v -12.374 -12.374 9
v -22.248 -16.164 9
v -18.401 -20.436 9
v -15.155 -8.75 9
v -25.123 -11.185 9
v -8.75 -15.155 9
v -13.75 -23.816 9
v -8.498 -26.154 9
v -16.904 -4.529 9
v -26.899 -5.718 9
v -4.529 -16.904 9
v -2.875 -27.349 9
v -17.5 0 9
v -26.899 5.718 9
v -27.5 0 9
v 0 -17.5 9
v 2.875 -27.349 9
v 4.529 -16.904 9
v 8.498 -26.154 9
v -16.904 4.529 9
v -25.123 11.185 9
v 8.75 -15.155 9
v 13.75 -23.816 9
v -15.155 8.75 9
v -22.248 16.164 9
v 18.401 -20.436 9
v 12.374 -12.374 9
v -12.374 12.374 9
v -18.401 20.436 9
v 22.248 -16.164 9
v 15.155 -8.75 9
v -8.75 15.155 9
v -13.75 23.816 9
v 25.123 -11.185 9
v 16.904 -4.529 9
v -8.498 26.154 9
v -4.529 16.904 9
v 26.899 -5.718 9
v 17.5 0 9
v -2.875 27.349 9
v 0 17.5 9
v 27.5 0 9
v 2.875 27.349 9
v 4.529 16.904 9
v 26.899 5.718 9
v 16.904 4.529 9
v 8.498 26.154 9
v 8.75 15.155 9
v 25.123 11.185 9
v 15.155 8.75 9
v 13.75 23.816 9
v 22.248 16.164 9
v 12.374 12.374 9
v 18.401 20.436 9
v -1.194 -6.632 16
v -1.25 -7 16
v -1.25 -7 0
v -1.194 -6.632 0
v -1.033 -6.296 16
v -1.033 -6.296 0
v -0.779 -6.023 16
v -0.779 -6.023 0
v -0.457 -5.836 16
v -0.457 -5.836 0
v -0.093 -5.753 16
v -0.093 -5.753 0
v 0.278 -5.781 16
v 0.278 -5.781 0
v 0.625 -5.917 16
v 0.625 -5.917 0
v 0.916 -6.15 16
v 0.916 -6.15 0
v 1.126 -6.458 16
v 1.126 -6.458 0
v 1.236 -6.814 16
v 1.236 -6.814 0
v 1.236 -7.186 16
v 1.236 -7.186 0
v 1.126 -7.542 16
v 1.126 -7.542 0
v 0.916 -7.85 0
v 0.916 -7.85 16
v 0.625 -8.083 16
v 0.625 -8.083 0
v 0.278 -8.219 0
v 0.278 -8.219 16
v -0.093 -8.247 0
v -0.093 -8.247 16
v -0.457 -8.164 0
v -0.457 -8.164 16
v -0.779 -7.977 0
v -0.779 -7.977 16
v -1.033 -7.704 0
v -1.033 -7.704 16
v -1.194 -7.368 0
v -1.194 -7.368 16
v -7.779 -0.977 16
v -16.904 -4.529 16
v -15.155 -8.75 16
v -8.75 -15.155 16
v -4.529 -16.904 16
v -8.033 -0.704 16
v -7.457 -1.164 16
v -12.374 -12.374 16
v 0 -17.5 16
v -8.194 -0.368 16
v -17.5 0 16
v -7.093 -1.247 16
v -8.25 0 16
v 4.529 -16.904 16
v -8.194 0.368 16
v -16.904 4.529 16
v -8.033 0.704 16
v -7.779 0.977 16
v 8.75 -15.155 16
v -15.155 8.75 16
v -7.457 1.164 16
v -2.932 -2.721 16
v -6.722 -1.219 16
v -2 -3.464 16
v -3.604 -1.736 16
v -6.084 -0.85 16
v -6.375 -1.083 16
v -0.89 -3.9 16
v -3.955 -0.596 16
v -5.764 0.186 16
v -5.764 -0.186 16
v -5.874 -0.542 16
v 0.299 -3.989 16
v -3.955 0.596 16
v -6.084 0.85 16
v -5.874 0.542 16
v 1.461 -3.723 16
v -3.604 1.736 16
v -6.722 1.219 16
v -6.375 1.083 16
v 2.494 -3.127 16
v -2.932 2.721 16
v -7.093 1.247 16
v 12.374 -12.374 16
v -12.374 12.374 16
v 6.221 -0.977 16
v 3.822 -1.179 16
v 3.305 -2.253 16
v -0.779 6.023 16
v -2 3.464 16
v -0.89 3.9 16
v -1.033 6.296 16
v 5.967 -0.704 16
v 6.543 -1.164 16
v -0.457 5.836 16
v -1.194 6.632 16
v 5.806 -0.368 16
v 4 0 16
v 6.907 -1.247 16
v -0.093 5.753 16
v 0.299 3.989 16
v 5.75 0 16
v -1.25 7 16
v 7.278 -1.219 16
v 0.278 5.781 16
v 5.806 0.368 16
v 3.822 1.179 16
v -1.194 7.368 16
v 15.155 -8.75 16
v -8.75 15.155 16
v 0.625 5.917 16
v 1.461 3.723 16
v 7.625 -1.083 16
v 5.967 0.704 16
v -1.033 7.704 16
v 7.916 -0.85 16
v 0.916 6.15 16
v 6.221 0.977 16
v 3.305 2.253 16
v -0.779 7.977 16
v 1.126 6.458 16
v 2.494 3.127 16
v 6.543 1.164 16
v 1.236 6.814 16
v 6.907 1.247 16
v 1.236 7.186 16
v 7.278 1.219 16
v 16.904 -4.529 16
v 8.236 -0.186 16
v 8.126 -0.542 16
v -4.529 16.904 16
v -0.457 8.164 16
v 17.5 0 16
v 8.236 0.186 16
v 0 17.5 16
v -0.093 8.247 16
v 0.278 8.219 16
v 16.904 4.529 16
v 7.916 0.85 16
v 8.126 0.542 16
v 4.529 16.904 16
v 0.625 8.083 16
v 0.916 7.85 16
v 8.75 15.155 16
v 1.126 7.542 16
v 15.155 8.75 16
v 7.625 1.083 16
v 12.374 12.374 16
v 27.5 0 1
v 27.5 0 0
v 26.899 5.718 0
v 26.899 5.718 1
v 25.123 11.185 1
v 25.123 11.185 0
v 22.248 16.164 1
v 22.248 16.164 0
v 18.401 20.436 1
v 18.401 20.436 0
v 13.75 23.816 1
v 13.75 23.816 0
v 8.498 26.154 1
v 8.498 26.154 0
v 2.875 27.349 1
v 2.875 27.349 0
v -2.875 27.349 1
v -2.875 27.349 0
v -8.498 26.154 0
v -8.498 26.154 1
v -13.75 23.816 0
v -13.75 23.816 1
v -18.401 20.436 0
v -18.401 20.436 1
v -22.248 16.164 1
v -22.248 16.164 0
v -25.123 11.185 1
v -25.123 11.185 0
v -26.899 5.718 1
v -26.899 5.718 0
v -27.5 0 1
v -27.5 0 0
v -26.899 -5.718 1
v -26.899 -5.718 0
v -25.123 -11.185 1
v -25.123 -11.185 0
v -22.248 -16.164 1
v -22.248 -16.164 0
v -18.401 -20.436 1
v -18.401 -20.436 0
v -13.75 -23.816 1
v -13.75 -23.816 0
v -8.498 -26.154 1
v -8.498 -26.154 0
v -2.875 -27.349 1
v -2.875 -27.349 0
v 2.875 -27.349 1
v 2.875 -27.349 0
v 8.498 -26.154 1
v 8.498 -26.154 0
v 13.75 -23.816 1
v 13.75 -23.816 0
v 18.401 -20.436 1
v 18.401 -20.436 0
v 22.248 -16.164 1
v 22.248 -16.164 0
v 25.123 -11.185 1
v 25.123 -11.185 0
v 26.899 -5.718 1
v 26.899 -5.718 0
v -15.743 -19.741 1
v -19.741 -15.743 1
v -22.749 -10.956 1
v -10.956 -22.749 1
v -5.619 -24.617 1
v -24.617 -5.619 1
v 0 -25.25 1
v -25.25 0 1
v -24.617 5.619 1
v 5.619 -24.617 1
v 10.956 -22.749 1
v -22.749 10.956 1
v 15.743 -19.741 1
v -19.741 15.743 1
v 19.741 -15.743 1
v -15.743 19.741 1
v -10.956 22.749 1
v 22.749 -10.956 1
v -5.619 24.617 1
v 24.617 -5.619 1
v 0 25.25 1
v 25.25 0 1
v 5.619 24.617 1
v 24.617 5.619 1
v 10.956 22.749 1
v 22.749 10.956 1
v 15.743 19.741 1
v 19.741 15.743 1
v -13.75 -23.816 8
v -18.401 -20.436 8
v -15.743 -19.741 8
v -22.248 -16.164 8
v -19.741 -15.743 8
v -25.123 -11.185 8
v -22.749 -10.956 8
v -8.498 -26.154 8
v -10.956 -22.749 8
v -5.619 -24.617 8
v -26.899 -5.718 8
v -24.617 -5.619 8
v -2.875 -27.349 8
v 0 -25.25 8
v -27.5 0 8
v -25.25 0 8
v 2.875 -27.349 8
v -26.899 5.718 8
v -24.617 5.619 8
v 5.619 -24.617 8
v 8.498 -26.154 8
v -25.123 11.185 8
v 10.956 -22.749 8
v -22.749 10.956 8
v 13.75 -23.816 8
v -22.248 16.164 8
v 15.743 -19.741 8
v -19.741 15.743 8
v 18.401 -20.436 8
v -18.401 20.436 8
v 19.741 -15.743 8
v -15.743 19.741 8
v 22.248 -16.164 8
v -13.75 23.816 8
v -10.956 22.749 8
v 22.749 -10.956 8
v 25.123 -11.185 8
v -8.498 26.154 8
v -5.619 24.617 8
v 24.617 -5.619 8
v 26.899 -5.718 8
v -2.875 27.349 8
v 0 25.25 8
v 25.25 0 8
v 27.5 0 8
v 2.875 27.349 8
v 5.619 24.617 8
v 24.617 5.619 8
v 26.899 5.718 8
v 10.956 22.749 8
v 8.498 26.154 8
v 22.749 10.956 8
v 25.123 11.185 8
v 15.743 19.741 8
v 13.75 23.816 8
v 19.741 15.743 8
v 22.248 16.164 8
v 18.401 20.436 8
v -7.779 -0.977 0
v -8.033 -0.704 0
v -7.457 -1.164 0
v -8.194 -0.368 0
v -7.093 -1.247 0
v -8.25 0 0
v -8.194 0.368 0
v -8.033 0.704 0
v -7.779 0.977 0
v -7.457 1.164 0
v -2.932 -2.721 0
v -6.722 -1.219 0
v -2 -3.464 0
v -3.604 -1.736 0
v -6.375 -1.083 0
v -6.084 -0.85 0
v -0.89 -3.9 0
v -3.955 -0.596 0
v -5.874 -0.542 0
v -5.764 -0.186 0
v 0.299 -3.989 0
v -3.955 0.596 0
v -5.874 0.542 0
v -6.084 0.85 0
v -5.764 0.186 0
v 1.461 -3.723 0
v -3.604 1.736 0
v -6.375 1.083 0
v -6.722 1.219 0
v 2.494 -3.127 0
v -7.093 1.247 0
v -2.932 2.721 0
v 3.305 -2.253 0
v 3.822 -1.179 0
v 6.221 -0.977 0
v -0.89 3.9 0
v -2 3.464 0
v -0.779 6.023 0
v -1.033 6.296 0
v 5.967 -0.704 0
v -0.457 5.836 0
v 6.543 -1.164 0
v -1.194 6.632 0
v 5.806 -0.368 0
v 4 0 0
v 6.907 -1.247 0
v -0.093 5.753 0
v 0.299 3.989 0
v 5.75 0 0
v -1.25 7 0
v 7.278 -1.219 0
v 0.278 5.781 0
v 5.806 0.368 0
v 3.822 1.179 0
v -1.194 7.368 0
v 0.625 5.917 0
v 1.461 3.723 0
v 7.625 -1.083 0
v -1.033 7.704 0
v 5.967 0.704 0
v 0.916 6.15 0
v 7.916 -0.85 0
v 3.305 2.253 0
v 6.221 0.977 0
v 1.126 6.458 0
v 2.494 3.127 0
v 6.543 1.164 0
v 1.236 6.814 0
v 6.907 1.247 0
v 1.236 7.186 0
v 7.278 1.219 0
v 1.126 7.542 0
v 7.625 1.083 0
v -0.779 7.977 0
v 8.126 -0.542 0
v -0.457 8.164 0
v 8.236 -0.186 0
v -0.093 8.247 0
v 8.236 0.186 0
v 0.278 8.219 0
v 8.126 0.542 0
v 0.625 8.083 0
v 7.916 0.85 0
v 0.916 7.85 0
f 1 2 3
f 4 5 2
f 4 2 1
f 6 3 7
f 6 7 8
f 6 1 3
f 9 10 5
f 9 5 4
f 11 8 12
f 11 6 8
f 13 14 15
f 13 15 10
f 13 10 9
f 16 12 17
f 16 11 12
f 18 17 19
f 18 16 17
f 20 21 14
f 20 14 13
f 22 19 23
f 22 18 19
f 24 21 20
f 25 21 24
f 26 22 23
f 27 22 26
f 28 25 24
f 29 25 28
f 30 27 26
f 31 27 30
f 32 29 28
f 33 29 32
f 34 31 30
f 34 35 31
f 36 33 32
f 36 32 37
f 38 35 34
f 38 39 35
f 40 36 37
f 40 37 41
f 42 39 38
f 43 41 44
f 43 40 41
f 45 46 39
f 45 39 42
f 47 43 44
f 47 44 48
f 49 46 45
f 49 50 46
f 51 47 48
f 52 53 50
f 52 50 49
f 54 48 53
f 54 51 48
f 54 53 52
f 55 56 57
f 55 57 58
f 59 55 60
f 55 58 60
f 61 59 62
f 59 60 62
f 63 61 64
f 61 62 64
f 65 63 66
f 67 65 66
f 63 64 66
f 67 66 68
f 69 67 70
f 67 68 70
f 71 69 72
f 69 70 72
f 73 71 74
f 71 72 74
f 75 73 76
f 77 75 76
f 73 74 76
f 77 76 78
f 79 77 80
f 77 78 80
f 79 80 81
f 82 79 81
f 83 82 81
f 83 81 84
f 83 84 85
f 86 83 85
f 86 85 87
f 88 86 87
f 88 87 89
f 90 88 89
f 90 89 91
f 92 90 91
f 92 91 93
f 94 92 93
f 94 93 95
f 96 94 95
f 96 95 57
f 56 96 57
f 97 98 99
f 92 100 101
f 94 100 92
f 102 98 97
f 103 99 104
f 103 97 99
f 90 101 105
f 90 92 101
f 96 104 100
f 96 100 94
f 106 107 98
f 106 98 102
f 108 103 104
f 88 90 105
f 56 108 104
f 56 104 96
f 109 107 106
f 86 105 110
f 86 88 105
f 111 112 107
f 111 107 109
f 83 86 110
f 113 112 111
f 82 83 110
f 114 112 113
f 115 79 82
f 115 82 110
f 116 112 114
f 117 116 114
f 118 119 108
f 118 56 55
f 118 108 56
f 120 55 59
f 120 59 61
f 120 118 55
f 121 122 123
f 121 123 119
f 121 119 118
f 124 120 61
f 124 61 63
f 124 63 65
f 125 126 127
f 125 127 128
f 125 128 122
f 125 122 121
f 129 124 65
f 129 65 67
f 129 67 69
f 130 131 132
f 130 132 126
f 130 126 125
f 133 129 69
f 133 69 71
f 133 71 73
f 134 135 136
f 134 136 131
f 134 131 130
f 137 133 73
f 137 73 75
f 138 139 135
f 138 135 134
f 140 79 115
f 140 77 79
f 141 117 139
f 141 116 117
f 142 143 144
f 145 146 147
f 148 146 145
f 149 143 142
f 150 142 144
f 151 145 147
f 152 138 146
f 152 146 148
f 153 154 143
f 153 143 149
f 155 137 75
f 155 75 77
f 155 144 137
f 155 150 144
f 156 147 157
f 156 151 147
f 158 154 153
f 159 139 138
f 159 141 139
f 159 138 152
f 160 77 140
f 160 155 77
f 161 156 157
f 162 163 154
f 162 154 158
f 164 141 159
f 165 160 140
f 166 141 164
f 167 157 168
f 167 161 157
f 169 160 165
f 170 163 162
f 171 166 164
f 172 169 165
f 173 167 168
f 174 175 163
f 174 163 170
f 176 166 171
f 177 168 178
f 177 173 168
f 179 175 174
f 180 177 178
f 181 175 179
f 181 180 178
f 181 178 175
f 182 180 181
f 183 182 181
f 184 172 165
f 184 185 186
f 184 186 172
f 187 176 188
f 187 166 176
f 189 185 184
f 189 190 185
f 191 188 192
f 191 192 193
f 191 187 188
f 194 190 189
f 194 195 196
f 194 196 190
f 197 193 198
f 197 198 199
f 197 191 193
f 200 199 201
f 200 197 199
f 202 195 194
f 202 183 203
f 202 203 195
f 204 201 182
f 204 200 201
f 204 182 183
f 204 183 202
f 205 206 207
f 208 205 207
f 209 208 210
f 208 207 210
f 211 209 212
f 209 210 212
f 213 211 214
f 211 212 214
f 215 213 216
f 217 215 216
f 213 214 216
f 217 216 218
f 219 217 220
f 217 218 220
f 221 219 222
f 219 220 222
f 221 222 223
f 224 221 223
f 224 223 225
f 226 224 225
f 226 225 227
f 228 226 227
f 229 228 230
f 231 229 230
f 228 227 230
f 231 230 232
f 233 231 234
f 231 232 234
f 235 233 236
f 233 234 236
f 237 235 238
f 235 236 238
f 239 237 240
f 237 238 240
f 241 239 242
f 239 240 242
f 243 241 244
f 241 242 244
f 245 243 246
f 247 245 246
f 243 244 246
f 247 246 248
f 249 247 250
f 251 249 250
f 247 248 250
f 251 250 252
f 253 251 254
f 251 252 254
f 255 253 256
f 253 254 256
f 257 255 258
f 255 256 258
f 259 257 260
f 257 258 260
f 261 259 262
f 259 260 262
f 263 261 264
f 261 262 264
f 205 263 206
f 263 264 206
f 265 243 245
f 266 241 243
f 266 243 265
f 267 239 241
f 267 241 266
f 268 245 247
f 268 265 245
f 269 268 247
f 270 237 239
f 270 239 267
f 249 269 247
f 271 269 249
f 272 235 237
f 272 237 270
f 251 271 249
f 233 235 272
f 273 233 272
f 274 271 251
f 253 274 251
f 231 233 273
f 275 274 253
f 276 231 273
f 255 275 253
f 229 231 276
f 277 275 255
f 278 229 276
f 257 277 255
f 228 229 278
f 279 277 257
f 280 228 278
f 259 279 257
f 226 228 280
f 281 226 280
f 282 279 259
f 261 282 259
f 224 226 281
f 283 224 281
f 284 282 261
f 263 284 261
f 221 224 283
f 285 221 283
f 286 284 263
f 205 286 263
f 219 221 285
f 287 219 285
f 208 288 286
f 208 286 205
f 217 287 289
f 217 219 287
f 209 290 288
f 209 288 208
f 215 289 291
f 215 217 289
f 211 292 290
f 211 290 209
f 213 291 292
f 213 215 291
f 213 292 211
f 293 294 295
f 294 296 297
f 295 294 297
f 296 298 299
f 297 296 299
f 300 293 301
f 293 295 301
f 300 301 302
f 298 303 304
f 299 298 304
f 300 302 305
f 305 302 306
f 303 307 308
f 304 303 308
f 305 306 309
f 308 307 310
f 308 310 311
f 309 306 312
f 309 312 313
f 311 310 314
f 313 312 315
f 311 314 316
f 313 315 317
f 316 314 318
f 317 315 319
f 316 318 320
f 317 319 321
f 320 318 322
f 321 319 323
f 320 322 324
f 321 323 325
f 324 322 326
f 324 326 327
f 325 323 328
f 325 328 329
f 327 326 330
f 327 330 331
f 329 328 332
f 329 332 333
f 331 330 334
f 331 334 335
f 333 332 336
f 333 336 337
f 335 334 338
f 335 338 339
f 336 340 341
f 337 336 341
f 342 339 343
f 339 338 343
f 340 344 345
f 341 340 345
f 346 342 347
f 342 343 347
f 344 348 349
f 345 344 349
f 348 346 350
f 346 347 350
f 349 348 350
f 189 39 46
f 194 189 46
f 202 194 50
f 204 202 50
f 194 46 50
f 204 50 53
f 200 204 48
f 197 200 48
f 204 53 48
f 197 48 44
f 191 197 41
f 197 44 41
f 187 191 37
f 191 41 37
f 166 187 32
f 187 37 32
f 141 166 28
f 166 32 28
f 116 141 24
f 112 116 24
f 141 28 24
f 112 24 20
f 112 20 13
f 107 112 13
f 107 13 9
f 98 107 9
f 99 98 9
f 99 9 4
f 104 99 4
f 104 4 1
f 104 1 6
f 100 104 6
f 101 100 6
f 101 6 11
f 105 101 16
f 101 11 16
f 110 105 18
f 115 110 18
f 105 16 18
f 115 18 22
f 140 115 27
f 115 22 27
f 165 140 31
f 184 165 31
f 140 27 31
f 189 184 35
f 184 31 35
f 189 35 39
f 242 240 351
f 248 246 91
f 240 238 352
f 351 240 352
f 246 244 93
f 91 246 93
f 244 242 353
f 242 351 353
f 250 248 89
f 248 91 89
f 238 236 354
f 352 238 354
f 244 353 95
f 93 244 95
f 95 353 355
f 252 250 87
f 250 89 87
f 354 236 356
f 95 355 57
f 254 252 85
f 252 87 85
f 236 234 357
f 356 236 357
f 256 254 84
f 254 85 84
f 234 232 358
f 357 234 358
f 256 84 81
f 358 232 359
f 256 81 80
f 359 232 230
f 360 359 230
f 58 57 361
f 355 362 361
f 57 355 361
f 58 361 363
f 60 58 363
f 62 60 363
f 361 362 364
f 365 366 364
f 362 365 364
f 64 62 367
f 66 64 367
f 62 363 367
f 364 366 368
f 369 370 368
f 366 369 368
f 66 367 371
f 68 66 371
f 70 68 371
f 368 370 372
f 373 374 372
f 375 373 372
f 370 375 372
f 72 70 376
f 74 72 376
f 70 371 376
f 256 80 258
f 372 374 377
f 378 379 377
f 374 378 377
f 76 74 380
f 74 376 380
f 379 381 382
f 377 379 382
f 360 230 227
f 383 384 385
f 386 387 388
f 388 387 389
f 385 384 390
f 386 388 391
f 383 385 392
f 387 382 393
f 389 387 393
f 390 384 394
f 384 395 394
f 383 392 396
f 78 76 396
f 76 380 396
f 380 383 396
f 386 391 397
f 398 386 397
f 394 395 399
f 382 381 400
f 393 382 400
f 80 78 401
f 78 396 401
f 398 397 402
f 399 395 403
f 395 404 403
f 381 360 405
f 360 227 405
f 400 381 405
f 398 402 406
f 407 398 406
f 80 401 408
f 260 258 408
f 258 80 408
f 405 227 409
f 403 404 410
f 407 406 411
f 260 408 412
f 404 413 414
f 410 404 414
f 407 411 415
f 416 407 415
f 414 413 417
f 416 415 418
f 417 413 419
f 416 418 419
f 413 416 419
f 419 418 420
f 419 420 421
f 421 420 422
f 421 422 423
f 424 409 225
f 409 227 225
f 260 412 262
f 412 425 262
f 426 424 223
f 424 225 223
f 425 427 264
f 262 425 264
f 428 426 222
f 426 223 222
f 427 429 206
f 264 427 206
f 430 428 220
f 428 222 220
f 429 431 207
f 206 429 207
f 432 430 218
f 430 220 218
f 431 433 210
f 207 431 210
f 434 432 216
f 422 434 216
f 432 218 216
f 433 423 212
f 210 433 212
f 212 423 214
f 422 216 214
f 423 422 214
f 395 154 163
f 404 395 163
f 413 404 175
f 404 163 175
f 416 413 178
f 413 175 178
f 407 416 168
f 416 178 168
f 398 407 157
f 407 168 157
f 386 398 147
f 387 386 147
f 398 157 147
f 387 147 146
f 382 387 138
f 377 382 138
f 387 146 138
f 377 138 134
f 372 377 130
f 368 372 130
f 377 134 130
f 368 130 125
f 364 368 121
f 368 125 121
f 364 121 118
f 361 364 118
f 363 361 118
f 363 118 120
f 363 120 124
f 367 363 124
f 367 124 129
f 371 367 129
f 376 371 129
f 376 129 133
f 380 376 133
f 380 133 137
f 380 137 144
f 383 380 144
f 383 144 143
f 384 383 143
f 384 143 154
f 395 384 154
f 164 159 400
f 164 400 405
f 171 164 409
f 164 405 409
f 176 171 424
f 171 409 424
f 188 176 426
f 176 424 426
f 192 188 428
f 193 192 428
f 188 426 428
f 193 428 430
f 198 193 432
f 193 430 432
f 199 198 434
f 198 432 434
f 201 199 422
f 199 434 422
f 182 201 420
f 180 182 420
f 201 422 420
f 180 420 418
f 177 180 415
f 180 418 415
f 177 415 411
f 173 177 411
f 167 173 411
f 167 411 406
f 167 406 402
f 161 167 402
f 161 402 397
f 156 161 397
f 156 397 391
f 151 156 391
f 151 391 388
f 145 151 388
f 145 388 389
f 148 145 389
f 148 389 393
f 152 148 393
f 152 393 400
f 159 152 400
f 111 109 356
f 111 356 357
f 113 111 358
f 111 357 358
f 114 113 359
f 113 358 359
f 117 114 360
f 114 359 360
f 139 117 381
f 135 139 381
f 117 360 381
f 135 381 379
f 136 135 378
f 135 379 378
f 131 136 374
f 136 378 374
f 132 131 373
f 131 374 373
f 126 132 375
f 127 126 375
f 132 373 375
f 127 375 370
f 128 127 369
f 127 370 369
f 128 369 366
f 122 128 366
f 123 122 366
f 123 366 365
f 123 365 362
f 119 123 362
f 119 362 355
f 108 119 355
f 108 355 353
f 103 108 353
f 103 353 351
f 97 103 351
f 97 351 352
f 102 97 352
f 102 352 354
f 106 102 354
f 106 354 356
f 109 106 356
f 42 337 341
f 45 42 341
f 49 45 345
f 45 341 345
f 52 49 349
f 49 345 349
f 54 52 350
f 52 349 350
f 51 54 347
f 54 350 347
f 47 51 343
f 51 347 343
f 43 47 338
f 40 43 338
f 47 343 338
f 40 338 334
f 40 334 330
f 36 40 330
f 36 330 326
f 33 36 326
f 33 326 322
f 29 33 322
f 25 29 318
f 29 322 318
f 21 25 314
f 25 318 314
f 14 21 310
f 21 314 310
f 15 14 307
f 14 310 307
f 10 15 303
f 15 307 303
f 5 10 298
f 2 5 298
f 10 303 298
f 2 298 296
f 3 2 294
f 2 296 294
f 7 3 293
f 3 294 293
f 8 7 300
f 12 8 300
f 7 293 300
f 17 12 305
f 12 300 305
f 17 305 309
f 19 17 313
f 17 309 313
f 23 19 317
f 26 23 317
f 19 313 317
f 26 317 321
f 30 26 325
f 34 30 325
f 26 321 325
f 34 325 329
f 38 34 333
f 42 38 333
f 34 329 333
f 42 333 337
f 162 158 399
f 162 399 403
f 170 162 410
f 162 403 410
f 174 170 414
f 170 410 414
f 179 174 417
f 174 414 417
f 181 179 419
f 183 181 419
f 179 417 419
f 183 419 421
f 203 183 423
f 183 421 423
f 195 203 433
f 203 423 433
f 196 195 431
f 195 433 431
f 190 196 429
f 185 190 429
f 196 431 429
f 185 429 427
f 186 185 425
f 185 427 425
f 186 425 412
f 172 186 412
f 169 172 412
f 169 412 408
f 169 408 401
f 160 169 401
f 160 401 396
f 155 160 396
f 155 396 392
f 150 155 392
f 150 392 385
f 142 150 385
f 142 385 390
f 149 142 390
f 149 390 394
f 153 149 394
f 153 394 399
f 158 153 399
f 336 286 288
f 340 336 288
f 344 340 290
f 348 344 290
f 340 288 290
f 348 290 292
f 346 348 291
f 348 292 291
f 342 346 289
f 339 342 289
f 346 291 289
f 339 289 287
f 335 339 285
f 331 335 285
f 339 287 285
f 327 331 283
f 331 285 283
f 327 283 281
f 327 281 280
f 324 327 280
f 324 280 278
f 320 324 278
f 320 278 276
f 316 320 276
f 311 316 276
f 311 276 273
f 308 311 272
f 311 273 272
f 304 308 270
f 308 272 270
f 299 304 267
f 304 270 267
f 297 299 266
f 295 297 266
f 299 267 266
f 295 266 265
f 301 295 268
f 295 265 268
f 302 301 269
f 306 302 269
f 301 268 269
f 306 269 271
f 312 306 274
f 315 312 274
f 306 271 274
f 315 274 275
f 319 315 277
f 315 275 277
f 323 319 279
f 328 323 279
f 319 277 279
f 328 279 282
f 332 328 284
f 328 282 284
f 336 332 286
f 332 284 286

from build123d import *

# Parameters (mm, degrees)
SKETCH_1_R          = 27.5
EXTRUDE_1_DEPTH     = 1
SKETCH_2_R          = 25.25
EXTRUDE_2_DEPTH     = 7
SKETCH_3_R          = 27.5
EXTRUDE_3_DEPTH     = 1
SKETCH_4_R          = 17.5
EXTRUDE_4_DEPTH     = 7
SKETCH_5_R          = 4
CUT_EXTRUDE_1_DEPTH = 100
SKETCH_6_R          = 1.25
CUT_EXTRUDE_2_DEPTH = 100


with BuildPart() as part:
    # 草图1 → 凸台-拉伸1 (new body)
    with BuildSketch(Plane.XY):
        Circle(SKETCH_1_R)
    extrude(amount=EXTRUDE_1_DEPTH)

    # 草图2 → 凸台-拉伸2 (add)
    with BuildSketch(Plane.XY.offset(1)):
        Circle(SKETCH_2_R)
    extrude(amount=EXTRUDE_2_DEPTH)

    # 草图3 → 凸台-拉伸3 (add)
    with BuildSketch(Plane.XY.offset(8)):
        Circle(SKETCH_3_R)
    extrude(amount=EXTRUDE_3_DEPTH)

    # 草图4 → 凸台-拉伸4 (add)
    with BuildSketch(Plane.XY.offset(9)):
        Circle(SKETCH_4_R)
    extrude(amount=EXTRUDE_4_DEPTH)

    # 草图5 → 切除-拉伸1 (cut)
    with BuildSketch(Plane.XY.offset(16)):
        Circle(SKETCH_5_R)
    extrude(amount=-CUT_EXTRUDE_1_DEPTH, mode=Mode.SUBTRACT)

    # 草图6 → 切除-拉伸2 (cut)
    with BuildSketch(Plane(origin=(0, 0, 0), x_dir=(-1, 0, 0), z_dir=(0, 0, -1))):
        with Locations((7, 0)):
            Circle(SKETCH_6_R)
        with Locations((0, -7)):
            Circle(SKETCH_6_R)
        with Locations((-7, 0)):
            Circle(SKETCH_6_R)
        with Locations((0, 7)):
            Circle(SKETCH_6_R)
    extrude(amount=-CUT_EXTRUDE_2_DEPTH, mode=Mode.SUBTRACT)


solid = part.part
